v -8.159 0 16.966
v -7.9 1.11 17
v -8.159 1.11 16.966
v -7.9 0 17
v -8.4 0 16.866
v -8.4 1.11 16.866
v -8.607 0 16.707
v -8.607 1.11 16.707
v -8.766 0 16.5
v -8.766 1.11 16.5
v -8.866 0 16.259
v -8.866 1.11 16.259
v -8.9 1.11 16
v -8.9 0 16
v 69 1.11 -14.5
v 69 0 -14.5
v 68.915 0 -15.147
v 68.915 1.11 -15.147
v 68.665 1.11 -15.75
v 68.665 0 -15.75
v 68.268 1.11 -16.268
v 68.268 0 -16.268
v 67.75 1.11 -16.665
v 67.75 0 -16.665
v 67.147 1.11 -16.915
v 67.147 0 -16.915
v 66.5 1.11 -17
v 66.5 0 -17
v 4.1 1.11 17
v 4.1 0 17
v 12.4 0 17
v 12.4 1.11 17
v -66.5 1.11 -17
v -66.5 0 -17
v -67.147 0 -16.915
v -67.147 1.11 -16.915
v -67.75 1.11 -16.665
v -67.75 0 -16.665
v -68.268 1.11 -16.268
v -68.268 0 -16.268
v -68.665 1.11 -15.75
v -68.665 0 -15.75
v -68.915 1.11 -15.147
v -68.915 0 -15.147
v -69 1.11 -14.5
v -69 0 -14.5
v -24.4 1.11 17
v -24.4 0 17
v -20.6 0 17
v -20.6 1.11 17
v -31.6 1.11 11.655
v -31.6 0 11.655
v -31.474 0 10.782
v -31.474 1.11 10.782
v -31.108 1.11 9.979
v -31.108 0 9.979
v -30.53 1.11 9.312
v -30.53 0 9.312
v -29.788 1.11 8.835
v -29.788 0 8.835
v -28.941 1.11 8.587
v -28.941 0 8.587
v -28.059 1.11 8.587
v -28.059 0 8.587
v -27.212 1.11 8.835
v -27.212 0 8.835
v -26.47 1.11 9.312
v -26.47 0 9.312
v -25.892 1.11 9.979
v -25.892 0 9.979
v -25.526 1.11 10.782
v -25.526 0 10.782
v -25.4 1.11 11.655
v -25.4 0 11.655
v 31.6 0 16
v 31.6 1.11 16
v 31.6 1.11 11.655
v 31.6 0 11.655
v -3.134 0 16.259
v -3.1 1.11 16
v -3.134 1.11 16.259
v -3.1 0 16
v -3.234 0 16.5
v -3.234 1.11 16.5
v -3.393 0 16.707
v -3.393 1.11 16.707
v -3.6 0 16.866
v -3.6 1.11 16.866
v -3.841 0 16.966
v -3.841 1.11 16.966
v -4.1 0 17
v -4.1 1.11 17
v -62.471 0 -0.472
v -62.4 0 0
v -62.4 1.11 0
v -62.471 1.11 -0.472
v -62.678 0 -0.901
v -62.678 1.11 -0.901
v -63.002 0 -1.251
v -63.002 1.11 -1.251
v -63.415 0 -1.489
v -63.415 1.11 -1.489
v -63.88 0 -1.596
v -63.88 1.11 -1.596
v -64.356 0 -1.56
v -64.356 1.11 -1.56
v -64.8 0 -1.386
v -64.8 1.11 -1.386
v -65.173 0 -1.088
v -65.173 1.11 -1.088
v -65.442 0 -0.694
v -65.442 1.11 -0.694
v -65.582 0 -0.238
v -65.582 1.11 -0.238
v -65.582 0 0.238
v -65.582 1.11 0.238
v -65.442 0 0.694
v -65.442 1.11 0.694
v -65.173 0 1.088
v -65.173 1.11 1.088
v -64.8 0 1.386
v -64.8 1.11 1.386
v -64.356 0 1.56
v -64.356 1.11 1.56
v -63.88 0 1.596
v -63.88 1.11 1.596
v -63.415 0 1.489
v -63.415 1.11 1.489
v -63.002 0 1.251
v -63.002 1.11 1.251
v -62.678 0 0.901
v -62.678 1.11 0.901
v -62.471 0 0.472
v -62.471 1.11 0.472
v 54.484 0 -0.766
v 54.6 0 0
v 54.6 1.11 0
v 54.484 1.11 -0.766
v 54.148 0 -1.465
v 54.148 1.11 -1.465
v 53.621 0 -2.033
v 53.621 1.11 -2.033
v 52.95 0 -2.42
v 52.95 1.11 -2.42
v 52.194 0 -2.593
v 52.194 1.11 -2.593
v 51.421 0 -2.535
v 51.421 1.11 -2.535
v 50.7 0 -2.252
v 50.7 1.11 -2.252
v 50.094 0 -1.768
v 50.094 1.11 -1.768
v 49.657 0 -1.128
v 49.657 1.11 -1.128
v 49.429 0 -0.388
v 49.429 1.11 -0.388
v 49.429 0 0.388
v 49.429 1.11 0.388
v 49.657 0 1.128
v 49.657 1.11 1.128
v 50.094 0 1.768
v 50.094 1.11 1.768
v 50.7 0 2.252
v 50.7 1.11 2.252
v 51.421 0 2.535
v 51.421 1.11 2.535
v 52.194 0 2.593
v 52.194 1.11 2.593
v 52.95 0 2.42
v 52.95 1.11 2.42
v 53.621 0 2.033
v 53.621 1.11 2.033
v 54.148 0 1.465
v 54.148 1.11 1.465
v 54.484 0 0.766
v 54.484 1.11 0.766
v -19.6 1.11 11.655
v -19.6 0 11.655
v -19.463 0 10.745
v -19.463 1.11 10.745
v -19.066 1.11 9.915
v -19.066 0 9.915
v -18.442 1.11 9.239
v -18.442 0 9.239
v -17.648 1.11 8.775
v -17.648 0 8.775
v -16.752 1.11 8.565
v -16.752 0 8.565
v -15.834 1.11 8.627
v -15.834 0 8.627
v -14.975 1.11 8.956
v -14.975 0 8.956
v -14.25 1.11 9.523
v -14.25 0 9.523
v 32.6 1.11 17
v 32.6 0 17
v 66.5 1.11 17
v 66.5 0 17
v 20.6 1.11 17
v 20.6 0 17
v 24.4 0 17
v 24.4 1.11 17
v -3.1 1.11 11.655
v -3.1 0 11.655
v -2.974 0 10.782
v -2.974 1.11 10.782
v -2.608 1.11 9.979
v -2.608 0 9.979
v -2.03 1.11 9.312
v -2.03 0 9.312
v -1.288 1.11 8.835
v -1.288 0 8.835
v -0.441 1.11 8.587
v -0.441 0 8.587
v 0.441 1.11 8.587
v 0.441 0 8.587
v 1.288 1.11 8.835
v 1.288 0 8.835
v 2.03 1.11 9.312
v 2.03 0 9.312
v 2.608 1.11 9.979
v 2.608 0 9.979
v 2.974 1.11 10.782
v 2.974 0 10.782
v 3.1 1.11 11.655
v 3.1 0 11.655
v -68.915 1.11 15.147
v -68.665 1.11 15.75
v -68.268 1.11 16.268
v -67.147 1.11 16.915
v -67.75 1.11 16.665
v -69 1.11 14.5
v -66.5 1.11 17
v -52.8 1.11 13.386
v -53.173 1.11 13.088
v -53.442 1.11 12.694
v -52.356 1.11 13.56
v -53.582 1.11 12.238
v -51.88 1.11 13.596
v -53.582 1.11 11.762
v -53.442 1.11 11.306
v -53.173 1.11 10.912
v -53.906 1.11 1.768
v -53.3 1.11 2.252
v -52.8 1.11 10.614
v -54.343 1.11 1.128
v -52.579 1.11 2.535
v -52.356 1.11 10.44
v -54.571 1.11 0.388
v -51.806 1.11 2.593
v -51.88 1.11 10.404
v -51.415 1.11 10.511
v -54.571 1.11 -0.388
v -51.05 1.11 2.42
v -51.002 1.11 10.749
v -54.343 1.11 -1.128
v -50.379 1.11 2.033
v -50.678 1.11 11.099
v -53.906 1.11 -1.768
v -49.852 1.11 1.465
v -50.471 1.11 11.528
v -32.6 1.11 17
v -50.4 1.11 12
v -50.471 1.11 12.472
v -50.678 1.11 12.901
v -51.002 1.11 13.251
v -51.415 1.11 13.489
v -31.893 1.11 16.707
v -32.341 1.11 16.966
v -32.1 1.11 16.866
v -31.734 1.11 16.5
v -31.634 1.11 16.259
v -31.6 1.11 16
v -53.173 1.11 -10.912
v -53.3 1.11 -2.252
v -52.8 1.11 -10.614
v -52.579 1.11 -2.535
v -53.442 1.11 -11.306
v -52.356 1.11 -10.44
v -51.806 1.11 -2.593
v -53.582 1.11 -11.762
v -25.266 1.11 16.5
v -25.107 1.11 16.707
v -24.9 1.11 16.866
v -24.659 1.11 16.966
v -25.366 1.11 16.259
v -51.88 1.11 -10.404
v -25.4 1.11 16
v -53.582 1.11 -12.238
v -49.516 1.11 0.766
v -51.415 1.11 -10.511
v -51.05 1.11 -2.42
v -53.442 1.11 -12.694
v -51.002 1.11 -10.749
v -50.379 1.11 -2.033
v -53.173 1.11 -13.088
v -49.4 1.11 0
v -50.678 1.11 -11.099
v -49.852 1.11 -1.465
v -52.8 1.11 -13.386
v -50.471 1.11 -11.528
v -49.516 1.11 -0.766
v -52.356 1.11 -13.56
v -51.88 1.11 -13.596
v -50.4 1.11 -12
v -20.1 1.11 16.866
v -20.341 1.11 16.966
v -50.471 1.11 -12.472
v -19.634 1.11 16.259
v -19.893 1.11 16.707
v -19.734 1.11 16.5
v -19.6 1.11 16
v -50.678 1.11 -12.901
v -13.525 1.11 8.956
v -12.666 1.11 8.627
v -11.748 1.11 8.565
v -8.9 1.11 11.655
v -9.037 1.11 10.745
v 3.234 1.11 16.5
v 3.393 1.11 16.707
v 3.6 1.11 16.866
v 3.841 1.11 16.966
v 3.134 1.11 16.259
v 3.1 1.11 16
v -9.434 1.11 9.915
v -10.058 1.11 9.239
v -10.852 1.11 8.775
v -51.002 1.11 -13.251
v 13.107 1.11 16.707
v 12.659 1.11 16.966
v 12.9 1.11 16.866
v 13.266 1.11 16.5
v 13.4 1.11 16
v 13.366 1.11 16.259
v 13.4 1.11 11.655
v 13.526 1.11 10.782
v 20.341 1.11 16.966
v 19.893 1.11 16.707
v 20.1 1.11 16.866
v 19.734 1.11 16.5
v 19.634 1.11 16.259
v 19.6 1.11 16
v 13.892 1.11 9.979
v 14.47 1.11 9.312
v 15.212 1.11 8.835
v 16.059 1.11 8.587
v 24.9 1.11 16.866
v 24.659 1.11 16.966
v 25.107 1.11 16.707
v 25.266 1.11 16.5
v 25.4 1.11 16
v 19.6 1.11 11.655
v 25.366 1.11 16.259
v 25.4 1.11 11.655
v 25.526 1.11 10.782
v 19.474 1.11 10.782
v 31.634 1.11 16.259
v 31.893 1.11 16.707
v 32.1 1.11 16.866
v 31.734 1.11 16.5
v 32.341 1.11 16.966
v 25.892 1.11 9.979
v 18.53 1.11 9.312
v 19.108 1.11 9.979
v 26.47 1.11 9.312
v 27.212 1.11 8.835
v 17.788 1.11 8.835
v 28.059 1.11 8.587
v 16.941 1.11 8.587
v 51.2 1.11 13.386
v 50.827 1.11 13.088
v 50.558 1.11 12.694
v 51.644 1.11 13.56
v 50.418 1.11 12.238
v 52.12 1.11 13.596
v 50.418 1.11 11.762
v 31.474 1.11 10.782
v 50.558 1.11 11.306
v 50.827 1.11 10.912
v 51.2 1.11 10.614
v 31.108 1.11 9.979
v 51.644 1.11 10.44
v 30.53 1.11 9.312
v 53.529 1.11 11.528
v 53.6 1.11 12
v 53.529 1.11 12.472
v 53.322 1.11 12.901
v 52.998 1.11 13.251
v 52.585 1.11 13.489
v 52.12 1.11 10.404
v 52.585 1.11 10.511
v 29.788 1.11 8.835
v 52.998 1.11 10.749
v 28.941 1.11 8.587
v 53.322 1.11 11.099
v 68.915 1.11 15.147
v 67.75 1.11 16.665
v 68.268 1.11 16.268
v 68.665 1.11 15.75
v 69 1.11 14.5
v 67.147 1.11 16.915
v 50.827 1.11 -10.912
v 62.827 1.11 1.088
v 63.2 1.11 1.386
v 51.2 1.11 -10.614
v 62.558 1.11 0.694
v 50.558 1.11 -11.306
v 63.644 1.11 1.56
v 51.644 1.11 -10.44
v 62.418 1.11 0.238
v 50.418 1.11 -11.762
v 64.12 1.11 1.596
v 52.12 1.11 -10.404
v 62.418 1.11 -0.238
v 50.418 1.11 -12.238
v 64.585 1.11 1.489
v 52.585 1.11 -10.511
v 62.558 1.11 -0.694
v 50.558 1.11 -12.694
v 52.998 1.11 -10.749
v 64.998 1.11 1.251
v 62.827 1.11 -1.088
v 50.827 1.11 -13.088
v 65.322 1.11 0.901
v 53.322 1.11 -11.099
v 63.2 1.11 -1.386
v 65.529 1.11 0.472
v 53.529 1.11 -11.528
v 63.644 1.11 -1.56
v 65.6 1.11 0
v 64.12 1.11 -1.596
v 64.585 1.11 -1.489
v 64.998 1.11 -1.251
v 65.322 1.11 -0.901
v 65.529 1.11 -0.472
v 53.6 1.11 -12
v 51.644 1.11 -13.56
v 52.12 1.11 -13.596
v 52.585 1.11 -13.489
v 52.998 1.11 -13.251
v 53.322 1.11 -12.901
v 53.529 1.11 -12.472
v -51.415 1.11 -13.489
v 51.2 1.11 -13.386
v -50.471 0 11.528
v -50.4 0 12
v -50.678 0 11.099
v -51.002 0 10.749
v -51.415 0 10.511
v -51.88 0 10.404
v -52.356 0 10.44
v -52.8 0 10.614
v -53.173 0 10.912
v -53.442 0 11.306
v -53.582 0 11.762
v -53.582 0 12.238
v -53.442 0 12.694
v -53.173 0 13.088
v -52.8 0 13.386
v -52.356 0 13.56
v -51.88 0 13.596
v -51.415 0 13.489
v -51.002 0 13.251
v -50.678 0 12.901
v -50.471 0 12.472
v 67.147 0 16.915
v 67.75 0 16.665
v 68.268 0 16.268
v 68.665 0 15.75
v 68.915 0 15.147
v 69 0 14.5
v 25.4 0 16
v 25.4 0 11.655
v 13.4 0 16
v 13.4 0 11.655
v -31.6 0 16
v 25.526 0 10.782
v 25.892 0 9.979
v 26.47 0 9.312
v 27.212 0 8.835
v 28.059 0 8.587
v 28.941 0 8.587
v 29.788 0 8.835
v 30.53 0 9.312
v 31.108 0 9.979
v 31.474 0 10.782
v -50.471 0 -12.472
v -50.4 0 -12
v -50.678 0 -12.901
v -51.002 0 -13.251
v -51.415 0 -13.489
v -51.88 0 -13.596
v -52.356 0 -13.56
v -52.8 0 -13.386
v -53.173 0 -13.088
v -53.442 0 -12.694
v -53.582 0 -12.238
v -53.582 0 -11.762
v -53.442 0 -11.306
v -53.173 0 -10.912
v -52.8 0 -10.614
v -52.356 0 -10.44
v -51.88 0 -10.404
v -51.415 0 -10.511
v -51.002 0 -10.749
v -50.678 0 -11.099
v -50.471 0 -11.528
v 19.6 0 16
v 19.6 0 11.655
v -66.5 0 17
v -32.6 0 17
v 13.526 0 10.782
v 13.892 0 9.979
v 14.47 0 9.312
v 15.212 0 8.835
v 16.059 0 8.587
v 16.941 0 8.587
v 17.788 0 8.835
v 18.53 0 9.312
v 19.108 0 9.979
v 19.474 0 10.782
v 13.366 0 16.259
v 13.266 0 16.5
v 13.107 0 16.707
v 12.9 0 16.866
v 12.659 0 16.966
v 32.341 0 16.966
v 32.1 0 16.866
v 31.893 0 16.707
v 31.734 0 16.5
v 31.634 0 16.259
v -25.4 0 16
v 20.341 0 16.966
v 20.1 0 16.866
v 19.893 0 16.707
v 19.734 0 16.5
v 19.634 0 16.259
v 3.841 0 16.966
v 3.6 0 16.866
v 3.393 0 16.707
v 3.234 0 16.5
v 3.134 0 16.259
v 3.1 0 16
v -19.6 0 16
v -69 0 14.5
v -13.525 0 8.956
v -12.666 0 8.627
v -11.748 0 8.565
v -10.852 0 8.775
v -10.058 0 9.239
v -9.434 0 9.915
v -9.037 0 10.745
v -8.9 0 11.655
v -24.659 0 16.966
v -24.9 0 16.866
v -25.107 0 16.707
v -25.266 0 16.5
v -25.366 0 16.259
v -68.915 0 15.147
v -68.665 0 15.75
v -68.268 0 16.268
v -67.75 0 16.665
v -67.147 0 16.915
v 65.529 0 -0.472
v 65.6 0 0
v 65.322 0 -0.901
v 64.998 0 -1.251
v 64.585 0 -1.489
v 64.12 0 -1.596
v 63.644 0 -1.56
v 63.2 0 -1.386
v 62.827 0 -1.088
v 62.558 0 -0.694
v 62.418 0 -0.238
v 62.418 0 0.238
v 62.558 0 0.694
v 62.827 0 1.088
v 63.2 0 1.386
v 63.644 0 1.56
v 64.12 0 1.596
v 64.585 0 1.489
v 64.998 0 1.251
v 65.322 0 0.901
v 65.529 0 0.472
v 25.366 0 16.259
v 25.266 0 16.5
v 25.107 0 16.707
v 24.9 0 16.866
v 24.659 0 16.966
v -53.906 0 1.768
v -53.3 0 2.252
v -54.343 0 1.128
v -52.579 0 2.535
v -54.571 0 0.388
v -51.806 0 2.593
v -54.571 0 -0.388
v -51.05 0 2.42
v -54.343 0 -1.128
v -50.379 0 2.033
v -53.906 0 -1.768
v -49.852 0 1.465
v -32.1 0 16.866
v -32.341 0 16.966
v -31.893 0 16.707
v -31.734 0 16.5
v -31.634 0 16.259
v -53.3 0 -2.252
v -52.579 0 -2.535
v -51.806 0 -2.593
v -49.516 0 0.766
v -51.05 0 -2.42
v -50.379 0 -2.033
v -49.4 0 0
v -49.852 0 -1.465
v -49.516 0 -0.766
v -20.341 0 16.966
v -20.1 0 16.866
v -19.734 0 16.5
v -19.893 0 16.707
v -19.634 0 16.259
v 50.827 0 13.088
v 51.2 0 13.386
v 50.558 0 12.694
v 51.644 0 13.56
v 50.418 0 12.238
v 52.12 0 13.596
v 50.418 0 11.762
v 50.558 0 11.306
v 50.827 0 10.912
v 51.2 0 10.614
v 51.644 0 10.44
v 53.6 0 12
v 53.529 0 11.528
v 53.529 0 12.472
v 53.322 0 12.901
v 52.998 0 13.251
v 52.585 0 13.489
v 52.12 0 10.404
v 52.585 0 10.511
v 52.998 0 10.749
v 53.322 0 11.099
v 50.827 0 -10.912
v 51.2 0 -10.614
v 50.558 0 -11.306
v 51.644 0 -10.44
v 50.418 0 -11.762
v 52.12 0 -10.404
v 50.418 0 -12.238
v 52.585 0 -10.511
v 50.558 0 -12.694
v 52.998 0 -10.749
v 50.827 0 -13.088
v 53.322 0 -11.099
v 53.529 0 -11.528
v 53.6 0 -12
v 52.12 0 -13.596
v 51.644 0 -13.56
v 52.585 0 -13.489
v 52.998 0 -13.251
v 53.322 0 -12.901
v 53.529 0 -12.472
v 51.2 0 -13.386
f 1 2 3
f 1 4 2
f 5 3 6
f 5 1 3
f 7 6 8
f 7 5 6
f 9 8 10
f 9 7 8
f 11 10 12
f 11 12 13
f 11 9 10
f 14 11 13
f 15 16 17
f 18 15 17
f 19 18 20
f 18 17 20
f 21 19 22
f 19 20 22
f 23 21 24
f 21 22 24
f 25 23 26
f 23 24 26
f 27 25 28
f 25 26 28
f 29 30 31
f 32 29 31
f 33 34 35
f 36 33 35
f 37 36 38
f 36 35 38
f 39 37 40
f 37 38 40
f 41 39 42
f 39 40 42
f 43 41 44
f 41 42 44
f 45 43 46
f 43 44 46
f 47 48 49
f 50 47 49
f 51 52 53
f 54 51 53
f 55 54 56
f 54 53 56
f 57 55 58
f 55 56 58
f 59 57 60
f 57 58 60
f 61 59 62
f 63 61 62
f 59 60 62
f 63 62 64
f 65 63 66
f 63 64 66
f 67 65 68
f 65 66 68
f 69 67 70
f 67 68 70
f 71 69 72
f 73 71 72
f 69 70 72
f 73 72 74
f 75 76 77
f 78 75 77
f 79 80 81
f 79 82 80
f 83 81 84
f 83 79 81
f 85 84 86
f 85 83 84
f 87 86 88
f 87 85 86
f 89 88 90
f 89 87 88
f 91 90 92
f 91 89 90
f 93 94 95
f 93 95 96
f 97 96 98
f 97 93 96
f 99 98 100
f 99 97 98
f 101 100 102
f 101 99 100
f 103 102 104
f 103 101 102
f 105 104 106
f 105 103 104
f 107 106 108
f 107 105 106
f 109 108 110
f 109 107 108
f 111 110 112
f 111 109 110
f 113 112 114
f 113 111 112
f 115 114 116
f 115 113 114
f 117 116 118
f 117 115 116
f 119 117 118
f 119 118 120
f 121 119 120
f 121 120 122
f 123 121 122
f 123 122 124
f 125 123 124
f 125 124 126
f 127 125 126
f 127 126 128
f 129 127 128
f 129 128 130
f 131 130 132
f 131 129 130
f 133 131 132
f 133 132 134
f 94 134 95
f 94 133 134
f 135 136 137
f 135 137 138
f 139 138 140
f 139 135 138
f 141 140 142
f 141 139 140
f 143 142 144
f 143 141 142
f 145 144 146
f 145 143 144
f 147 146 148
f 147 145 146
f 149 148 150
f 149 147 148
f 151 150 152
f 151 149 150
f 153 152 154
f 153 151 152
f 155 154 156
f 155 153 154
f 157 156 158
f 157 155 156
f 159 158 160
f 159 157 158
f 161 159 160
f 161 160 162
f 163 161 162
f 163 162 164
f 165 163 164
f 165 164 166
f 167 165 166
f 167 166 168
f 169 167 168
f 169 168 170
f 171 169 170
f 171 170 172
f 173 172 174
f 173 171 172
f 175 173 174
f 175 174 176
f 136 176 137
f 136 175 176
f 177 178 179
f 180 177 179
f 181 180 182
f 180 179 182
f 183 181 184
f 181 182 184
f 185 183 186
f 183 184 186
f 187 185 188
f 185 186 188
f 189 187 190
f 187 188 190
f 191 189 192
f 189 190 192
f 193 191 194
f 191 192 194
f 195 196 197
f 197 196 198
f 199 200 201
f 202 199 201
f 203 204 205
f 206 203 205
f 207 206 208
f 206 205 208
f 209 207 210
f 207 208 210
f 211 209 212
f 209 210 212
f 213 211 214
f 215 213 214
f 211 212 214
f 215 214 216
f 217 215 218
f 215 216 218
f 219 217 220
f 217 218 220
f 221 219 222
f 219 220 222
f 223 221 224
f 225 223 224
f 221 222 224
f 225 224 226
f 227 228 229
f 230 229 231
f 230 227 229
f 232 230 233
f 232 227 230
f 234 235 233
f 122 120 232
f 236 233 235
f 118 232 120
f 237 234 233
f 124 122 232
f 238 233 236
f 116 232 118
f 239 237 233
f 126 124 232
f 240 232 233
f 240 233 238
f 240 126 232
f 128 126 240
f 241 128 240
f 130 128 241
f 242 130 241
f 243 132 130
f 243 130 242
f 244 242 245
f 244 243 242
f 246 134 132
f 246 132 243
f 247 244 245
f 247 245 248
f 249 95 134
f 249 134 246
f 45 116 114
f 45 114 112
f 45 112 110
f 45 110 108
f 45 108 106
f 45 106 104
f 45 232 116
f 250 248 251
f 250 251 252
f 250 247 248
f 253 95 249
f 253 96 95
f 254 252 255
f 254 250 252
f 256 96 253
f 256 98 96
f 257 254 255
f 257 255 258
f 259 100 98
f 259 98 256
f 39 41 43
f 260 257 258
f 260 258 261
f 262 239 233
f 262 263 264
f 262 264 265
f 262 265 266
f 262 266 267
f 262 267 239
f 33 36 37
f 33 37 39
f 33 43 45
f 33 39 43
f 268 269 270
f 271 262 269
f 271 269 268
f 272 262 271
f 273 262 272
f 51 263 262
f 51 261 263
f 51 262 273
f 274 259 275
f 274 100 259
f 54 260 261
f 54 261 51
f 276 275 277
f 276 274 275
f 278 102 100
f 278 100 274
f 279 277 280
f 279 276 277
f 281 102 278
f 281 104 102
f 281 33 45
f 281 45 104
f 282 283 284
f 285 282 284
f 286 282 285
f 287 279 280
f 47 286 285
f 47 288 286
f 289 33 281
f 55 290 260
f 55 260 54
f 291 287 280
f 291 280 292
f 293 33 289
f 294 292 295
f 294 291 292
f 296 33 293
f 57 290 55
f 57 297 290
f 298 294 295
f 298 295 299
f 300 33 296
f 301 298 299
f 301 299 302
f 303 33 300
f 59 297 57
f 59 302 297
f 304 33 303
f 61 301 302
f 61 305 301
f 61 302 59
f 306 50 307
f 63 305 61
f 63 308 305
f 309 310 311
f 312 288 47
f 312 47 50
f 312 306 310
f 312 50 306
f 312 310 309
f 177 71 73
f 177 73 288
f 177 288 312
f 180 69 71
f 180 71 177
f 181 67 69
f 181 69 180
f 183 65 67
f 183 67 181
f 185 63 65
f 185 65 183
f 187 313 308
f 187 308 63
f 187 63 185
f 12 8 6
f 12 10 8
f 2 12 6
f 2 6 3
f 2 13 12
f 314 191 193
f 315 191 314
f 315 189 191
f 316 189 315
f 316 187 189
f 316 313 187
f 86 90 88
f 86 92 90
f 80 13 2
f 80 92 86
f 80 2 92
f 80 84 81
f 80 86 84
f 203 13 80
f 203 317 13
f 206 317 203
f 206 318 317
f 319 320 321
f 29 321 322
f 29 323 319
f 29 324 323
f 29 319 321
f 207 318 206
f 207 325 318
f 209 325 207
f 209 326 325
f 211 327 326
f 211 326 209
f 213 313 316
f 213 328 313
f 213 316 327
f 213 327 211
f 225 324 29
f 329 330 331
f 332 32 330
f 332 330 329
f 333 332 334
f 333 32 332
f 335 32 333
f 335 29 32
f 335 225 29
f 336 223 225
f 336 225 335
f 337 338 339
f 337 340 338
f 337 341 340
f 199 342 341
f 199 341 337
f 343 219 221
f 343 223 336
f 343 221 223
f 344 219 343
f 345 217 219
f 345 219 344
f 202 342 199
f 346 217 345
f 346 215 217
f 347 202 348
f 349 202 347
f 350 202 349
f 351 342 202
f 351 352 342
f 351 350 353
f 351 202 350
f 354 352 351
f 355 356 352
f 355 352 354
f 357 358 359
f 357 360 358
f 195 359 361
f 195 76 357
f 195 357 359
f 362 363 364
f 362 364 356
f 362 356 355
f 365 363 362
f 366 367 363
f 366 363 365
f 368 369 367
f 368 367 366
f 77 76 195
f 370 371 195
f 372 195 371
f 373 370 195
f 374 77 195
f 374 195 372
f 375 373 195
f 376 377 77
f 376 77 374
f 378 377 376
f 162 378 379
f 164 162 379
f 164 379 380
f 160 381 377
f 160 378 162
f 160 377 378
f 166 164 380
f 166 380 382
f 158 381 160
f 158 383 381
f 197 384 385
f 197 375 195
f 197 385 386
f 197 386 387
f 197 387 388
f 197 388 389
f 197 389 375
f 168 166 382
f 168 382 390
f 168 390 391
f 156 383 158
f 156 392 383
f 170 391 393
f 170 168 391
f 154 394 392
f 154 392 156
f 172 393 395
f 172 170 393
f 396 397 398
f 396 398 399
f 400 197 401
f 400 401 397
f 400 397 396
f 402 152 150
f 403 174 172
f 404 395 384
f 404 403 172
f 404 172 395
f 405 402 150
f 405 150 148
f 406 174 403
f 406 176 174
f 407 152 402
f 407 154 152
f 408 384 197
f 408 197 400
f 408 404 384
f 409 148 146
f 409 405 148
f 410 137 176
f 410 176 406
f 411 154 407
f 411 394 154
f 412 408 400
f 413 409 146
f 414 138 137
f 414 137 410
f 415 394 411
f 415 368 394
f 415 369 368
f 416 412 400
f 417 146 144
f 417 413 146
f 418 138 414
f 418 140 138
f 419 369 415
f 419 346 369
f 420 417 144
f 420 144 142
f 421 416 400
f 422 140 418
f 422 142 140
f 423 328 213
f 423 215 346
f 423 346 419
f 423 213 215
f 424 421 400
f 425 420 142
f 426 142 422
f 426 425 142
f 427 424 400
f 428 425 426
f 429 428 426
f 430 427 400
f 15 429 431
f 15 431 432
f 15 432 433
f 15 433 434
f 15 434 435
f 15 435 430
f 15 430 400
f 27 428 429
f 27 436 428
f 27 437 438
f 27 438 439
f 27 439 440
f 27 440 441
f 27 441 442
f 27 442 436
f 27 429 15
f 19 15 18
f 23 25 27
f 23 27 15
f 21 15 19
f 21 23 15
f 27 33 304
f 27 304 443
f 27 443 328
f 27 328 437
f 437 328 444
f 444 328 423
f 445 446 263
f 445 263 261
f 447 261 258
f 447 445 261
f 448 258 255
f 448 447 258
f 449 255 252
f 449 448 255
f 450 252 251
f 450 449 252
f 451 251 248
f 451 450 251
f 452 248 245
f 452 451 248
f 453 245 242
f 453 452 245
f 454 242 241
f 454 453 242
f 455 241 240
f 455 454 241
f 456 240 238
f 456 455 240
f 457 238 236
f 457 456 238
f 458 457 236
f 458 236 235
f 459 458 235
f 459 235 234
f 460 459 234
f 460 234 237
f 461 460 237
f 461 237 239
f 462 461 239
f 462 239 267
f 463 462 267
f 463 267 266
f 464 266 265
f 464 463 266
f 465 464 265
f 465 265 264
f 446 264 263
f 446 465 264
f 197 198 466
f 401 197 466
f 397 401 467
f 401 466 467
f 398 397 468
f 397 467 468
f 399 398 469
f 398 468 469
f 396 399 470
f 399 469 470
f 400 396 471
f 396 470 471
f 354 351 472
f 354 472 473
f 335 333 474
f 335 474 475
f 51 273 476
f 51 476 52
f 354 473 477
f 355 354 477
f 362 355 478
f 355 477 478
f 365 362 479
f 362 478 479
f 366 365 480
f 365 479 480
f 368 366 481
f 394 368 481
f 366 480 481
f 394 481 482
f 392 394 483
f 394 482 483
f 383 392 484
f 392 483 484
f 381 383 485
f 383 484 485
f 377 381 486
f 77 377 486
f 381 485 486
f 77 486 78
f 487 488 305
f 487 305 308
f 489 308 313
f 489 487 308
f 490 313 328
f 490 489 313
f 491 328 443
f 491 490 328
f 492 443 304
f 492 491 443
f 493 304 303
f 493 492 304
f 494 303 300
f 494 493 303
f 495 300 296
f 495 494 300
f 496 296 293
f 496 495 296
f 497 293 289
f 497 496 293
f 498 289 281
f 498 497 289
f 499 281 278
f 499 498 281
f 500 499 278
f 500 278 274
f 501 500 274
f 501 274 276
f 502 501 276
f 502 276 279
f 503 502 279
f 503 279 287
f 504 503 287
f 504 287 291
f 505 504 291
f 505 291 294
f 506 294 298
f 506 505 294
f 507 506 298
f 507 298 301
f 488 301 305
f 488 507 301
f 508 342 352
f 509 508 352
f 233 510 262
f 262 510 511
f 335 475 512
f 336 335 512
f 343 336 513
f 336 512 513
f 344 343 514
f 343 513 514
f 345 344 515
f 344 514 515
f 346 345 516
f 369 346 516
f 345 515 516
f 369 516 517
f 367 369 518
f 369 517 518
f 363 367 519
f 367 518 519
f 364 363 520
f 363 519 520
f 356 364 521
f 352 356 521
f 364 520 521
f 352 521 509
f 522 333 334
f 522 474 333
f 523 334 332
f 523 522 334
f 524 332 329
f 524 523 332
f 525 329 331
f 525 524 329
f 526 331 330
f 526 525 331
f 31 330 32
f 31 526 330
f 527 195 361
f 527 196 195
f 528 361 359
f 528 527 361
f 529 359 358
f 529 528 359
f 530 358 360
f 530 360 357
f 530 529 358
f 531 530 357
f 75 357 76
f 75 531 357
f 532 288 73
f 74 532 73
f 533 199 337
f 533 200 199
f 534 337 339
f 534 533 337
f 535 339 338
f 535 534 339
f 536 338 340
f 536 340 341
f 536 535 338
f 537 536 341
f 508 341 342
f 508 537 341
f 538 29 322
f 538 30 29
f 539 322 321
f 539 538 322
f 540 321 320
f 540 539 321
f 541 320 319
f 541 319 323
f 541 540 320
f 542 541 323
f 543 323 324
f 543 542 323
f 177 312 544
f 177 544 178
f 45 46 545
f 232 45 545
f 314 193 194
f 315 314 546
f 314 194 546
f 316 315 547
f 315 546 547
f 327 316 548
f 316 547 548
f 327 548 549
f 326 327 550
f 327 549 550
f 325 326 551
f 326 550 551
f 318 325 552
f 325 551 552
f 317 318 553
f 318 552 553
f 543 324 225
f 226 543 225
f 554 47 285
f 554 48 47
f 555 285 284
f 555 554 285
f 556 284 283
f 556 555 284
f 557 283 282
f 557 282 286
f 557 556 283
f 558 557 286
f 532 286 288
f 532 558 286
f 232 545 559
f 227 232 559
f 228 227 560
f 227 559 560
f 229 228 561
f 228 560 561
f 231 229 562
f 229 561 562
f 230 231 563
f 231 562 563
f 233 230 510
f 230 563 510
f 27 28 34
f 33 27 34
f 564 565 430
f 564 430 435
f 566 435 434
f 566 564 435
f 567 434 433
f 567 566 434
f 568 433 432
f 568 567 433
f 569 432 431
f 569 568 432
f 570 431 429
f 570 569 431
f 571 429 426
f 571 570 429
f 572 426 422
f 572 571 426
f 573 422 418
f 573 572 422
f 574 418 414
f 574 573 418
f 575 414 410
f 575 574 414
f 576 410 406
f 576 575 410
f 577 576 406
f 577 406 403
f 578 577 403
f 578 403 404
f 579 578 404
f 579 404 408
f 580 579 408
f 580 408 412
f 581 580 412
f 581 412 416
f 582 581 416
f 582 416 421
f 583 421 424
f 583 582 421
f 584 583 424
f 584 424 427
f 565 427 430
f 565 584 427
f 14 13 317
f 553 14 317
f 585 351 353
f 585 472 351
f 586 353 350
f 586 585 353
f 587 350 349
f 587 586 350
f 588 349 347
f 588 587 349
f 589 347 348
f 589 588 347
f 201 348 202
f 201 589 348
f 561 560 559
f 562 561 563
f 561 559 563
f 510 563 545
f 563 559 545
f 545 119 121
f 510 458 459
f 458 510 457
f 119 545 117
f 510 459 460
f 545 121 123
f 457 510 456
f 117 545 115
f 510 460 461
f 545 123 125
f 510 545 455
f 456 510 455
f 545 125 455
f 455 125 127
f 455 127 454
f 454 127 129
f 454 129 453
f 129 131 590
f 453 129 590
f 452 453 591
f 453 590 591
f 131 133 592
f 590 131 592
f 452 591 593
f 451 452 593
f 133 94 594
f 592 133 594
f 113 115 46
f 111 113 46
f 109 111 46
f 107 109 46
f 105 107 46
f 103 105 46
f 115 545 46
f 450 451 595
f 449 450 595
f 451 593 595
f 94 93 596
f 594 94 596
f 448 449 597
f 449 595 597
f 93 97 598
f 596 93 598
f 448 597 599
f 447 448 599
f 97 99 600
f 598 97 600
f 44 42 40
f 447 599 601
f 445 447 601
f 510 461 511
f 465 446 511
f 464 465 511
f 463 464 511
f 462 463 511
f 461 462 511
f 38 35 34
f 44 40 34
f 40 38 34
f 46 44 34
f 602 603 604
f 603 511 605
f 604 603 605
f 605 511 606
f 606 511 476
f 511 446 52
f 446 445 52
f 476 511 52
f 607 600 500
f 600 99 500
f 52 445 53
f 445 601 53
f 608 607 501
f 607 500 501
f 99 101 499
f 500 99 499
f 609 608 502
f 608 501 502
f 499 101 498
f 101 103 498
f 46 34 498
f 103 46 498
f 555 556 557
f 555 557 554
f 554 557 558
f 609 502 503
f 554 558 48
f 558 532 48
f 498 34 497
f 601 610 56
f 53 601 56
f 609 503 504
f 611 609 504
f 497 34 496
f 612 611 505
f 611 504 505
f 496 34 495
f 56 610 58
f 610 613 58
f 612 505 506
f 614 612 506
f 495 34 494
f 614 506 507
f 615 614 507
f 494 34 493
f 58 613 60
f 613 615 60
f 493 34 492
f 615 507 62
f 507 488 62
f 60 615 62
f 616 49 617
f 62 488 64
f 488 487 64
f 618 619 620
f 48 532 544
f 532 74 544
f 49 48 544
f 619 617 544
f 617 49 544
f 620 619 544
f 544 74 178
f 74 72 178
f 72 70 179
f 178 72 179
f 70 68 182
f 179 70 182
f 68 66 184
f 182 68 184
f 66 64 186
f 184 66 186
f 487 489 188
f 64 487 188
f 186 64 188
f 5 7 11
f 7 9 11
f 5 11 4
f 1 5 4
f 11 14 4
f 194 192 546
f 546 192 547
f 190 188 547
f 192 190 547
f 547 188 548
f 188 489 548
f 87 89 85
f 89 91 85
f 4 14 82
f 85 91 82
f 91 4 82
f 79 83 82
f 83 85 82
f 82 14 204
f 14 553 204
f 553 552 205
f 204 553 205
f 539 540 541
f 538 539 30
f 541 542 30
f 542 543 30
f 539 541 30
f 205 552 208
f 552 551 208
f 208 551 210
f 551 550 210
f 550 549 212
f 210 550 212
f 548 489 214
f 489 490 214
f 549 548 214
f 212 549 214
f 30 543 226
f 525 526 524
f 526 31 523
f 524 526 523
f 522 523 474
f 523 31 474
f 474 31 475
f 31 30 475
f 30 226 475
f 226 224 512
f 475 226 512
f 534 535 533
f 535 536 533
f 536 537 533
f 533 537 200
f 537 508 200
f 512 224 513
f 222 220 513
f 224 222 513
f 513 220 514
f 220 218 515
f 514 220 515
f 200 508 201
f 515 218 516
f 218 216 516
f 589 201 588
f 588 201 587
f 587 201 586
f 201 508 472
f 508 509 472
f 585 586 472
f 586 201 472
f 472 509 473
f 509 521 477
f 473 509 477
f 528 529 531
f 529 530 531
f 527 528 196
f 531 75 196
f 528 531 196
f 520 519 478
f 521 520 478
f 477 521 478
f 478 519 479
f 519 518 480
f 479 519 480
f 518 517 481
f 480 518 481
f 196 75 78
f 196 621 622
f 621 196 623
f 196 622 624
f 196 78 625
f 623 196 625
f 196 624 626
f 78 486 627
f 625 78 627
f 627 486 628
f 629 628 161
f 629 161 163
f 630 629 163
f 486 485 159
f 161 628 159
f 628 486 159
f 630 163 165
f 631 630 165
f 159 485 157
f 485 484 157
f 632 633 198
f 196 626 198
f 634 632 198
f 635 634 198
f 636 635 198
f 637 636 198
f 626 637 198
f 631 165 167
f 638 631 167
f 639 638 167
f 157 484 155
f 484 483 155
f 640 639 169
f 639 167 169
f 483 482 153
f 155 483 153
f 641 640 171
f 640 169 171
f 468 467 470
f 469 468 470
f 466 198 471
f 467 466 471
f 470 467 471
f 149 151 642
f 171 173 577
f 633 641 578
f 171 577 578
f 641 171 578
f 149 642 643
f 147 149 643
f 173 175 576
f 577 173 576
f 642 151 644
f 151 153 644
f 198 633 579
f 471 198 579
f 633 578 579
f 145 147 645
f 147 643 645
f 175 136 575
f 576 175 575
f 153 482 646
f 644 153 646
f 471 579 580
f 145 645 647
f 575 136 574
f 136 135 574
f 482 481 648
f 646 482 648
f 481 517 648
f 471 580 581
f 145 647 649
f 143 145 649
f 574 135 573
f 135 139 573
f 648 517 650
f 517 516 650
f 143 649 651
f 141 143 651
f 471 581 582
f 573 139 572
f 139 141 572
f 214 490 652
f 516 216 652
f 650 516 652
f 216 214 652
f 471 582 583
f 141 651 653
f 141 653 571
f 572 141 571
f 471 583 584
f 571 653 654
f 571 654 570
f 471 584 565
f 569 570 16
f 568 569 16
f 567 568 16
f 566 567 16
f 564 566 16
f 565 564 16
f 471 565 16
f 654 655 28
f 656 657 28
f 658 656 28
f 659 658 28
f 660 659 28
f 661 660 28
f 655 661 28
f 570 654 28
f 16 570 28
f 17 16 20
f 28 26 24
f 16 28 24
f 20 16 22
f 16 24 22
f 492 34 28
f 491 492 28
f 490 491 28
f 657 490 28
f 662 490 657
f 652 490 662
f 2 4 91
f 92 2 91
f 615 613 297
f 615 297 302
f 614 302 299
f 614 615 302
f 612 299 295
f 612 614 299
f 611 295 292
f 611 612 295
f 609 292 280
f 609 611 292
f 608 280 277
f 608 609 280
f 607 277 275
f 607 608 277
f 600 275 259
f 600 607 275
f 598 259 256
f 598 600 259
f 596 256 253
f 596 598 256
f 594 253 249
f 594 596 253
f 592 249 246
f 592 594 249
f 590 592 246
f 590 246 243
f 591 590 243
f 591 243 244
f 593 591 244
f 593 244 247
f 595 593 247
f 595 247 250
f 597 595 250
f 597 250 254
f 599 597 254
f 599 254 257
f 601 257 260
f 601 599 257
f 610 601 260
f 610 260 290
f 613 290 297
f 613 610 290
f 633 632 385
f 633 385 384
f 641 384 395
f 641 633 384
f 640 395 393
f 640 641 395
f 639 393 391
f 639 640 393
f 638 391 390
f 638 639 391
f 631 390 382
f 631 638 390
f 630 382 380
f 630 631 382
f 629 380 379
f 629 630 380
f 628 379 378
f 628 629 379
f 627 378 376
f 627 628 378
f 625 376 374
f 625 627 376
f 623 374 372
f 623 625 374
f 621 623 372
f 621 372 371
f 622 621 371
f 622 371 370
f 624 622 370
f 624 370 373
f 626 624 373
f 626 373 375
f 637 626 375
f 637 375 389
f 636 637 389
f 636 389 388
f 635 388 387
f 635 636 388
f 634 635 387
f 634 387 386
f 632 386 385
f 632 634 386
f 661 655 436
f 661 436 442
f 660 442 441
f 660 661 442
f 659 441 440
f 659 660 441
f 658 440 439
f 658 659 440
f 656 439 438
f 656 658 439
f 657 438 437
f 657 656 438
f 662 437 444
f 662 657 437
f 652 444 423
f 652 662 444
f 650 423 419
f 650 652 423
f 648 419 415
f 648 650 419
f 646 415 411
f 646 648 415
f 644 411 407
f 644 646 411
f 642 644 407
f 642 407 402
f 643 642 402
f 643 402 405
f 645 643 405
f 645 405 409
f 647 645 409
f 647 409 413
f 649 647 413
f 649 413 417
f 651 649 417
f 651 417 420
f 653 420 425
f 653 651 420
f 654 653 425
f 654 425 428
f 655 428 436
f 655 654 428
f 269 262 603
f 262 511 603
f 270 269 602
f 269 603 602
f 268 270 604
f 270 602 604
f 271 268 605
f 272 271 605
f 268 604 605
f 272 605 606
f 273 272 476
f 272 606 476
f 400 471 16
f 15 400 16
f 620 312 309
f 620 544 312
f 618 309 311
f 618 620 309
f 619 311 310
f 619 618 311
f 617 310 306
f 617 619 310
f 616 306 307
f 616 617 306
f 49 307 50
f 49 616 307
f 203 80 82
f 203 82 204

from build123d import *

# Parameters (mm, degrees)
BOSS_EXTRUDE1_DEPTH = 1.11
SKETCH3_R           = 2.6
SKETCH3_R_2         = 1.6
CUT_EXTRUDE5_DEPTH  = 12.11
SKETCH4_R           = 3.1
CUT_EXTRUDE6_DEPTH  = 2.11
SKETCH5_R           = 3.1
CUT_EXTRUDE7_DEPTH  = 2.11
SKETCH6_W           = 6.2
SKETCH6_H           = 6
SKETCH6_W_2         = 10.7
CUT_EXTRUDE8_DEPTH  = 2.11
FILLET1_R           = 1


with BuildPart() as part:
    # Sketch1 → Boss-Extrude1 (new body)
    with BuildSketch(Plane(origin=(0, 0, 0), x_dir=(1, 0, 0), z_dir=(0, 1, 0))):
        with BuildLine():
            Line((-66.5, -17), (66.5, -17))
            ThreePointArc((66.5, -17), (68.267766953, -16.267766953), (69, -14.5))
            Line((69, -14.5), (69, 14.5))
            ThreePointArc((69, 14.5), (68.267766953, 16.267766953), (66.5, 17))
            Line((66.5, 17), (-66.5, 17))
            ThreePointArc((-66.5, 17), (-68.267766953, 16.267766953), (-69, 14.5))
            Line((-69, 14.5), (-69, -14.5))
            ThreePointArc((-69, -14.5), (-68.267766953, -16.267766953), (-66.5, -17))
        make_face()
    extrude(amount=BOSS_EXTRUDE1_DEPTH)

    # Sketch3 → Cut-Extrude5 (cut, through all)
    with BuildSketch(Plane(origin=(0, -10, 0), x_dir=(1, 0, 0), z_dir=(0, 1, 0))):
        with Locations((-52, 0)):
            Circle(SKETCH3_R)
        with Locations((52, 0)):
            Circle(SKETCH3_R)
        with Locations((-52, 12)):
            Circle(SKETCH3_R_2)
        with Locations((-52, -12)):
            Circle(SKETCH3_R_2)
        with Locations((52, -12)):
            Circle(SKETCH3_R_2)
        with Locations((52, 12)):
            Circle(SKETCH3_R_2)
        with Locations((-64, 0)):
            Circle(SKETCH3_R_2)
        with Locations((64, 0)):
            Circle(SKETCH3_R_2)
    extrude(amount=CUT_EXTRUDE5_DEPTH, mode=Mode.SUBTRACT)

    # Sketch4 → Cut-Extrude6 (cut, through all)
    with BuildSketch(Plane.XZ):
        with Locations((0, 11.655)):
            Circle(SKETCH4_R)
        with Locations((-12, 11.655)):
            Circle(SKETCH4_R)
    extrude(amount=-CUT_EXTRUDE6_DEPTH, mode=Mode.SUBTRACT)

    # Sketch5 → Cut-Extrude7 (cut, through all)
    with BuildSketch(Plane.XZ):
        with Locations((-16.5, 11.655)):
            Circle(SKETCH5_R)
        with Locations((-28.5, 11.655)):
            Circle(SKETCH5_R)
        with Locations((28.5, 11.655)):
            Circle(SKETCH5_R)
        with Locations((16.5, 11.655)):
            Circle(SKETCH5_R)
    extrude(amount=-CUT_EXTRUDE7_DEPTH, mode=Mode.SUBTRACT)

    # Sketch6 → Cut-Extrude8 (cut, through all)
    with BuildSketch(Plane(origin=(0, 1.11, 0), x_dir=(1, 0, 0), z_dir=(0, 1, 0))):
        with Locations((-28.5, -14.655)):
            Rectangle(SKETCH6_W, SKETCH6_H)
        with Locations((-14.25, -14.655)):
            Rectangle(SKETCH6_W_2, SKETCH6_H)
        with Locations((0, -14.655)):
            Rectangle(SKETCH6_W, SKETCH6_H)
        with Locations((28.5, -14.655)):
            Rectangle(SKETCH6_W, SKETCH6_H)
        with Locations((16.5, -14.655)):
            Rectangle(SKETCH6_W, SKETCH6_H)
    extrude(amount=-CUT_EXTRUDE8_DEPTH, mode=Mode.SUBTRACT)

    # Fillet1
    fillet1_edges = [part.edges().sort_by_distance(p)[0] for p in [
        (-31.6, 0.555, 17),
        (-25.4, 0.555, 17),
        (-8.9, 0.555, 17),
        (-19.6, 0.555, 17),
        (-3.1, 0.555, 17),
        (3.1, 0.555, 17),
        (25.4, 0.555, 17),
        (31.6, 0.555, 17),
        (13.4, 0.555, 17),
        (19.6, 0.555, 17),
    ]]
    fillet(fillet1_edges, radius=FILLET1_R)


solid = part.part
